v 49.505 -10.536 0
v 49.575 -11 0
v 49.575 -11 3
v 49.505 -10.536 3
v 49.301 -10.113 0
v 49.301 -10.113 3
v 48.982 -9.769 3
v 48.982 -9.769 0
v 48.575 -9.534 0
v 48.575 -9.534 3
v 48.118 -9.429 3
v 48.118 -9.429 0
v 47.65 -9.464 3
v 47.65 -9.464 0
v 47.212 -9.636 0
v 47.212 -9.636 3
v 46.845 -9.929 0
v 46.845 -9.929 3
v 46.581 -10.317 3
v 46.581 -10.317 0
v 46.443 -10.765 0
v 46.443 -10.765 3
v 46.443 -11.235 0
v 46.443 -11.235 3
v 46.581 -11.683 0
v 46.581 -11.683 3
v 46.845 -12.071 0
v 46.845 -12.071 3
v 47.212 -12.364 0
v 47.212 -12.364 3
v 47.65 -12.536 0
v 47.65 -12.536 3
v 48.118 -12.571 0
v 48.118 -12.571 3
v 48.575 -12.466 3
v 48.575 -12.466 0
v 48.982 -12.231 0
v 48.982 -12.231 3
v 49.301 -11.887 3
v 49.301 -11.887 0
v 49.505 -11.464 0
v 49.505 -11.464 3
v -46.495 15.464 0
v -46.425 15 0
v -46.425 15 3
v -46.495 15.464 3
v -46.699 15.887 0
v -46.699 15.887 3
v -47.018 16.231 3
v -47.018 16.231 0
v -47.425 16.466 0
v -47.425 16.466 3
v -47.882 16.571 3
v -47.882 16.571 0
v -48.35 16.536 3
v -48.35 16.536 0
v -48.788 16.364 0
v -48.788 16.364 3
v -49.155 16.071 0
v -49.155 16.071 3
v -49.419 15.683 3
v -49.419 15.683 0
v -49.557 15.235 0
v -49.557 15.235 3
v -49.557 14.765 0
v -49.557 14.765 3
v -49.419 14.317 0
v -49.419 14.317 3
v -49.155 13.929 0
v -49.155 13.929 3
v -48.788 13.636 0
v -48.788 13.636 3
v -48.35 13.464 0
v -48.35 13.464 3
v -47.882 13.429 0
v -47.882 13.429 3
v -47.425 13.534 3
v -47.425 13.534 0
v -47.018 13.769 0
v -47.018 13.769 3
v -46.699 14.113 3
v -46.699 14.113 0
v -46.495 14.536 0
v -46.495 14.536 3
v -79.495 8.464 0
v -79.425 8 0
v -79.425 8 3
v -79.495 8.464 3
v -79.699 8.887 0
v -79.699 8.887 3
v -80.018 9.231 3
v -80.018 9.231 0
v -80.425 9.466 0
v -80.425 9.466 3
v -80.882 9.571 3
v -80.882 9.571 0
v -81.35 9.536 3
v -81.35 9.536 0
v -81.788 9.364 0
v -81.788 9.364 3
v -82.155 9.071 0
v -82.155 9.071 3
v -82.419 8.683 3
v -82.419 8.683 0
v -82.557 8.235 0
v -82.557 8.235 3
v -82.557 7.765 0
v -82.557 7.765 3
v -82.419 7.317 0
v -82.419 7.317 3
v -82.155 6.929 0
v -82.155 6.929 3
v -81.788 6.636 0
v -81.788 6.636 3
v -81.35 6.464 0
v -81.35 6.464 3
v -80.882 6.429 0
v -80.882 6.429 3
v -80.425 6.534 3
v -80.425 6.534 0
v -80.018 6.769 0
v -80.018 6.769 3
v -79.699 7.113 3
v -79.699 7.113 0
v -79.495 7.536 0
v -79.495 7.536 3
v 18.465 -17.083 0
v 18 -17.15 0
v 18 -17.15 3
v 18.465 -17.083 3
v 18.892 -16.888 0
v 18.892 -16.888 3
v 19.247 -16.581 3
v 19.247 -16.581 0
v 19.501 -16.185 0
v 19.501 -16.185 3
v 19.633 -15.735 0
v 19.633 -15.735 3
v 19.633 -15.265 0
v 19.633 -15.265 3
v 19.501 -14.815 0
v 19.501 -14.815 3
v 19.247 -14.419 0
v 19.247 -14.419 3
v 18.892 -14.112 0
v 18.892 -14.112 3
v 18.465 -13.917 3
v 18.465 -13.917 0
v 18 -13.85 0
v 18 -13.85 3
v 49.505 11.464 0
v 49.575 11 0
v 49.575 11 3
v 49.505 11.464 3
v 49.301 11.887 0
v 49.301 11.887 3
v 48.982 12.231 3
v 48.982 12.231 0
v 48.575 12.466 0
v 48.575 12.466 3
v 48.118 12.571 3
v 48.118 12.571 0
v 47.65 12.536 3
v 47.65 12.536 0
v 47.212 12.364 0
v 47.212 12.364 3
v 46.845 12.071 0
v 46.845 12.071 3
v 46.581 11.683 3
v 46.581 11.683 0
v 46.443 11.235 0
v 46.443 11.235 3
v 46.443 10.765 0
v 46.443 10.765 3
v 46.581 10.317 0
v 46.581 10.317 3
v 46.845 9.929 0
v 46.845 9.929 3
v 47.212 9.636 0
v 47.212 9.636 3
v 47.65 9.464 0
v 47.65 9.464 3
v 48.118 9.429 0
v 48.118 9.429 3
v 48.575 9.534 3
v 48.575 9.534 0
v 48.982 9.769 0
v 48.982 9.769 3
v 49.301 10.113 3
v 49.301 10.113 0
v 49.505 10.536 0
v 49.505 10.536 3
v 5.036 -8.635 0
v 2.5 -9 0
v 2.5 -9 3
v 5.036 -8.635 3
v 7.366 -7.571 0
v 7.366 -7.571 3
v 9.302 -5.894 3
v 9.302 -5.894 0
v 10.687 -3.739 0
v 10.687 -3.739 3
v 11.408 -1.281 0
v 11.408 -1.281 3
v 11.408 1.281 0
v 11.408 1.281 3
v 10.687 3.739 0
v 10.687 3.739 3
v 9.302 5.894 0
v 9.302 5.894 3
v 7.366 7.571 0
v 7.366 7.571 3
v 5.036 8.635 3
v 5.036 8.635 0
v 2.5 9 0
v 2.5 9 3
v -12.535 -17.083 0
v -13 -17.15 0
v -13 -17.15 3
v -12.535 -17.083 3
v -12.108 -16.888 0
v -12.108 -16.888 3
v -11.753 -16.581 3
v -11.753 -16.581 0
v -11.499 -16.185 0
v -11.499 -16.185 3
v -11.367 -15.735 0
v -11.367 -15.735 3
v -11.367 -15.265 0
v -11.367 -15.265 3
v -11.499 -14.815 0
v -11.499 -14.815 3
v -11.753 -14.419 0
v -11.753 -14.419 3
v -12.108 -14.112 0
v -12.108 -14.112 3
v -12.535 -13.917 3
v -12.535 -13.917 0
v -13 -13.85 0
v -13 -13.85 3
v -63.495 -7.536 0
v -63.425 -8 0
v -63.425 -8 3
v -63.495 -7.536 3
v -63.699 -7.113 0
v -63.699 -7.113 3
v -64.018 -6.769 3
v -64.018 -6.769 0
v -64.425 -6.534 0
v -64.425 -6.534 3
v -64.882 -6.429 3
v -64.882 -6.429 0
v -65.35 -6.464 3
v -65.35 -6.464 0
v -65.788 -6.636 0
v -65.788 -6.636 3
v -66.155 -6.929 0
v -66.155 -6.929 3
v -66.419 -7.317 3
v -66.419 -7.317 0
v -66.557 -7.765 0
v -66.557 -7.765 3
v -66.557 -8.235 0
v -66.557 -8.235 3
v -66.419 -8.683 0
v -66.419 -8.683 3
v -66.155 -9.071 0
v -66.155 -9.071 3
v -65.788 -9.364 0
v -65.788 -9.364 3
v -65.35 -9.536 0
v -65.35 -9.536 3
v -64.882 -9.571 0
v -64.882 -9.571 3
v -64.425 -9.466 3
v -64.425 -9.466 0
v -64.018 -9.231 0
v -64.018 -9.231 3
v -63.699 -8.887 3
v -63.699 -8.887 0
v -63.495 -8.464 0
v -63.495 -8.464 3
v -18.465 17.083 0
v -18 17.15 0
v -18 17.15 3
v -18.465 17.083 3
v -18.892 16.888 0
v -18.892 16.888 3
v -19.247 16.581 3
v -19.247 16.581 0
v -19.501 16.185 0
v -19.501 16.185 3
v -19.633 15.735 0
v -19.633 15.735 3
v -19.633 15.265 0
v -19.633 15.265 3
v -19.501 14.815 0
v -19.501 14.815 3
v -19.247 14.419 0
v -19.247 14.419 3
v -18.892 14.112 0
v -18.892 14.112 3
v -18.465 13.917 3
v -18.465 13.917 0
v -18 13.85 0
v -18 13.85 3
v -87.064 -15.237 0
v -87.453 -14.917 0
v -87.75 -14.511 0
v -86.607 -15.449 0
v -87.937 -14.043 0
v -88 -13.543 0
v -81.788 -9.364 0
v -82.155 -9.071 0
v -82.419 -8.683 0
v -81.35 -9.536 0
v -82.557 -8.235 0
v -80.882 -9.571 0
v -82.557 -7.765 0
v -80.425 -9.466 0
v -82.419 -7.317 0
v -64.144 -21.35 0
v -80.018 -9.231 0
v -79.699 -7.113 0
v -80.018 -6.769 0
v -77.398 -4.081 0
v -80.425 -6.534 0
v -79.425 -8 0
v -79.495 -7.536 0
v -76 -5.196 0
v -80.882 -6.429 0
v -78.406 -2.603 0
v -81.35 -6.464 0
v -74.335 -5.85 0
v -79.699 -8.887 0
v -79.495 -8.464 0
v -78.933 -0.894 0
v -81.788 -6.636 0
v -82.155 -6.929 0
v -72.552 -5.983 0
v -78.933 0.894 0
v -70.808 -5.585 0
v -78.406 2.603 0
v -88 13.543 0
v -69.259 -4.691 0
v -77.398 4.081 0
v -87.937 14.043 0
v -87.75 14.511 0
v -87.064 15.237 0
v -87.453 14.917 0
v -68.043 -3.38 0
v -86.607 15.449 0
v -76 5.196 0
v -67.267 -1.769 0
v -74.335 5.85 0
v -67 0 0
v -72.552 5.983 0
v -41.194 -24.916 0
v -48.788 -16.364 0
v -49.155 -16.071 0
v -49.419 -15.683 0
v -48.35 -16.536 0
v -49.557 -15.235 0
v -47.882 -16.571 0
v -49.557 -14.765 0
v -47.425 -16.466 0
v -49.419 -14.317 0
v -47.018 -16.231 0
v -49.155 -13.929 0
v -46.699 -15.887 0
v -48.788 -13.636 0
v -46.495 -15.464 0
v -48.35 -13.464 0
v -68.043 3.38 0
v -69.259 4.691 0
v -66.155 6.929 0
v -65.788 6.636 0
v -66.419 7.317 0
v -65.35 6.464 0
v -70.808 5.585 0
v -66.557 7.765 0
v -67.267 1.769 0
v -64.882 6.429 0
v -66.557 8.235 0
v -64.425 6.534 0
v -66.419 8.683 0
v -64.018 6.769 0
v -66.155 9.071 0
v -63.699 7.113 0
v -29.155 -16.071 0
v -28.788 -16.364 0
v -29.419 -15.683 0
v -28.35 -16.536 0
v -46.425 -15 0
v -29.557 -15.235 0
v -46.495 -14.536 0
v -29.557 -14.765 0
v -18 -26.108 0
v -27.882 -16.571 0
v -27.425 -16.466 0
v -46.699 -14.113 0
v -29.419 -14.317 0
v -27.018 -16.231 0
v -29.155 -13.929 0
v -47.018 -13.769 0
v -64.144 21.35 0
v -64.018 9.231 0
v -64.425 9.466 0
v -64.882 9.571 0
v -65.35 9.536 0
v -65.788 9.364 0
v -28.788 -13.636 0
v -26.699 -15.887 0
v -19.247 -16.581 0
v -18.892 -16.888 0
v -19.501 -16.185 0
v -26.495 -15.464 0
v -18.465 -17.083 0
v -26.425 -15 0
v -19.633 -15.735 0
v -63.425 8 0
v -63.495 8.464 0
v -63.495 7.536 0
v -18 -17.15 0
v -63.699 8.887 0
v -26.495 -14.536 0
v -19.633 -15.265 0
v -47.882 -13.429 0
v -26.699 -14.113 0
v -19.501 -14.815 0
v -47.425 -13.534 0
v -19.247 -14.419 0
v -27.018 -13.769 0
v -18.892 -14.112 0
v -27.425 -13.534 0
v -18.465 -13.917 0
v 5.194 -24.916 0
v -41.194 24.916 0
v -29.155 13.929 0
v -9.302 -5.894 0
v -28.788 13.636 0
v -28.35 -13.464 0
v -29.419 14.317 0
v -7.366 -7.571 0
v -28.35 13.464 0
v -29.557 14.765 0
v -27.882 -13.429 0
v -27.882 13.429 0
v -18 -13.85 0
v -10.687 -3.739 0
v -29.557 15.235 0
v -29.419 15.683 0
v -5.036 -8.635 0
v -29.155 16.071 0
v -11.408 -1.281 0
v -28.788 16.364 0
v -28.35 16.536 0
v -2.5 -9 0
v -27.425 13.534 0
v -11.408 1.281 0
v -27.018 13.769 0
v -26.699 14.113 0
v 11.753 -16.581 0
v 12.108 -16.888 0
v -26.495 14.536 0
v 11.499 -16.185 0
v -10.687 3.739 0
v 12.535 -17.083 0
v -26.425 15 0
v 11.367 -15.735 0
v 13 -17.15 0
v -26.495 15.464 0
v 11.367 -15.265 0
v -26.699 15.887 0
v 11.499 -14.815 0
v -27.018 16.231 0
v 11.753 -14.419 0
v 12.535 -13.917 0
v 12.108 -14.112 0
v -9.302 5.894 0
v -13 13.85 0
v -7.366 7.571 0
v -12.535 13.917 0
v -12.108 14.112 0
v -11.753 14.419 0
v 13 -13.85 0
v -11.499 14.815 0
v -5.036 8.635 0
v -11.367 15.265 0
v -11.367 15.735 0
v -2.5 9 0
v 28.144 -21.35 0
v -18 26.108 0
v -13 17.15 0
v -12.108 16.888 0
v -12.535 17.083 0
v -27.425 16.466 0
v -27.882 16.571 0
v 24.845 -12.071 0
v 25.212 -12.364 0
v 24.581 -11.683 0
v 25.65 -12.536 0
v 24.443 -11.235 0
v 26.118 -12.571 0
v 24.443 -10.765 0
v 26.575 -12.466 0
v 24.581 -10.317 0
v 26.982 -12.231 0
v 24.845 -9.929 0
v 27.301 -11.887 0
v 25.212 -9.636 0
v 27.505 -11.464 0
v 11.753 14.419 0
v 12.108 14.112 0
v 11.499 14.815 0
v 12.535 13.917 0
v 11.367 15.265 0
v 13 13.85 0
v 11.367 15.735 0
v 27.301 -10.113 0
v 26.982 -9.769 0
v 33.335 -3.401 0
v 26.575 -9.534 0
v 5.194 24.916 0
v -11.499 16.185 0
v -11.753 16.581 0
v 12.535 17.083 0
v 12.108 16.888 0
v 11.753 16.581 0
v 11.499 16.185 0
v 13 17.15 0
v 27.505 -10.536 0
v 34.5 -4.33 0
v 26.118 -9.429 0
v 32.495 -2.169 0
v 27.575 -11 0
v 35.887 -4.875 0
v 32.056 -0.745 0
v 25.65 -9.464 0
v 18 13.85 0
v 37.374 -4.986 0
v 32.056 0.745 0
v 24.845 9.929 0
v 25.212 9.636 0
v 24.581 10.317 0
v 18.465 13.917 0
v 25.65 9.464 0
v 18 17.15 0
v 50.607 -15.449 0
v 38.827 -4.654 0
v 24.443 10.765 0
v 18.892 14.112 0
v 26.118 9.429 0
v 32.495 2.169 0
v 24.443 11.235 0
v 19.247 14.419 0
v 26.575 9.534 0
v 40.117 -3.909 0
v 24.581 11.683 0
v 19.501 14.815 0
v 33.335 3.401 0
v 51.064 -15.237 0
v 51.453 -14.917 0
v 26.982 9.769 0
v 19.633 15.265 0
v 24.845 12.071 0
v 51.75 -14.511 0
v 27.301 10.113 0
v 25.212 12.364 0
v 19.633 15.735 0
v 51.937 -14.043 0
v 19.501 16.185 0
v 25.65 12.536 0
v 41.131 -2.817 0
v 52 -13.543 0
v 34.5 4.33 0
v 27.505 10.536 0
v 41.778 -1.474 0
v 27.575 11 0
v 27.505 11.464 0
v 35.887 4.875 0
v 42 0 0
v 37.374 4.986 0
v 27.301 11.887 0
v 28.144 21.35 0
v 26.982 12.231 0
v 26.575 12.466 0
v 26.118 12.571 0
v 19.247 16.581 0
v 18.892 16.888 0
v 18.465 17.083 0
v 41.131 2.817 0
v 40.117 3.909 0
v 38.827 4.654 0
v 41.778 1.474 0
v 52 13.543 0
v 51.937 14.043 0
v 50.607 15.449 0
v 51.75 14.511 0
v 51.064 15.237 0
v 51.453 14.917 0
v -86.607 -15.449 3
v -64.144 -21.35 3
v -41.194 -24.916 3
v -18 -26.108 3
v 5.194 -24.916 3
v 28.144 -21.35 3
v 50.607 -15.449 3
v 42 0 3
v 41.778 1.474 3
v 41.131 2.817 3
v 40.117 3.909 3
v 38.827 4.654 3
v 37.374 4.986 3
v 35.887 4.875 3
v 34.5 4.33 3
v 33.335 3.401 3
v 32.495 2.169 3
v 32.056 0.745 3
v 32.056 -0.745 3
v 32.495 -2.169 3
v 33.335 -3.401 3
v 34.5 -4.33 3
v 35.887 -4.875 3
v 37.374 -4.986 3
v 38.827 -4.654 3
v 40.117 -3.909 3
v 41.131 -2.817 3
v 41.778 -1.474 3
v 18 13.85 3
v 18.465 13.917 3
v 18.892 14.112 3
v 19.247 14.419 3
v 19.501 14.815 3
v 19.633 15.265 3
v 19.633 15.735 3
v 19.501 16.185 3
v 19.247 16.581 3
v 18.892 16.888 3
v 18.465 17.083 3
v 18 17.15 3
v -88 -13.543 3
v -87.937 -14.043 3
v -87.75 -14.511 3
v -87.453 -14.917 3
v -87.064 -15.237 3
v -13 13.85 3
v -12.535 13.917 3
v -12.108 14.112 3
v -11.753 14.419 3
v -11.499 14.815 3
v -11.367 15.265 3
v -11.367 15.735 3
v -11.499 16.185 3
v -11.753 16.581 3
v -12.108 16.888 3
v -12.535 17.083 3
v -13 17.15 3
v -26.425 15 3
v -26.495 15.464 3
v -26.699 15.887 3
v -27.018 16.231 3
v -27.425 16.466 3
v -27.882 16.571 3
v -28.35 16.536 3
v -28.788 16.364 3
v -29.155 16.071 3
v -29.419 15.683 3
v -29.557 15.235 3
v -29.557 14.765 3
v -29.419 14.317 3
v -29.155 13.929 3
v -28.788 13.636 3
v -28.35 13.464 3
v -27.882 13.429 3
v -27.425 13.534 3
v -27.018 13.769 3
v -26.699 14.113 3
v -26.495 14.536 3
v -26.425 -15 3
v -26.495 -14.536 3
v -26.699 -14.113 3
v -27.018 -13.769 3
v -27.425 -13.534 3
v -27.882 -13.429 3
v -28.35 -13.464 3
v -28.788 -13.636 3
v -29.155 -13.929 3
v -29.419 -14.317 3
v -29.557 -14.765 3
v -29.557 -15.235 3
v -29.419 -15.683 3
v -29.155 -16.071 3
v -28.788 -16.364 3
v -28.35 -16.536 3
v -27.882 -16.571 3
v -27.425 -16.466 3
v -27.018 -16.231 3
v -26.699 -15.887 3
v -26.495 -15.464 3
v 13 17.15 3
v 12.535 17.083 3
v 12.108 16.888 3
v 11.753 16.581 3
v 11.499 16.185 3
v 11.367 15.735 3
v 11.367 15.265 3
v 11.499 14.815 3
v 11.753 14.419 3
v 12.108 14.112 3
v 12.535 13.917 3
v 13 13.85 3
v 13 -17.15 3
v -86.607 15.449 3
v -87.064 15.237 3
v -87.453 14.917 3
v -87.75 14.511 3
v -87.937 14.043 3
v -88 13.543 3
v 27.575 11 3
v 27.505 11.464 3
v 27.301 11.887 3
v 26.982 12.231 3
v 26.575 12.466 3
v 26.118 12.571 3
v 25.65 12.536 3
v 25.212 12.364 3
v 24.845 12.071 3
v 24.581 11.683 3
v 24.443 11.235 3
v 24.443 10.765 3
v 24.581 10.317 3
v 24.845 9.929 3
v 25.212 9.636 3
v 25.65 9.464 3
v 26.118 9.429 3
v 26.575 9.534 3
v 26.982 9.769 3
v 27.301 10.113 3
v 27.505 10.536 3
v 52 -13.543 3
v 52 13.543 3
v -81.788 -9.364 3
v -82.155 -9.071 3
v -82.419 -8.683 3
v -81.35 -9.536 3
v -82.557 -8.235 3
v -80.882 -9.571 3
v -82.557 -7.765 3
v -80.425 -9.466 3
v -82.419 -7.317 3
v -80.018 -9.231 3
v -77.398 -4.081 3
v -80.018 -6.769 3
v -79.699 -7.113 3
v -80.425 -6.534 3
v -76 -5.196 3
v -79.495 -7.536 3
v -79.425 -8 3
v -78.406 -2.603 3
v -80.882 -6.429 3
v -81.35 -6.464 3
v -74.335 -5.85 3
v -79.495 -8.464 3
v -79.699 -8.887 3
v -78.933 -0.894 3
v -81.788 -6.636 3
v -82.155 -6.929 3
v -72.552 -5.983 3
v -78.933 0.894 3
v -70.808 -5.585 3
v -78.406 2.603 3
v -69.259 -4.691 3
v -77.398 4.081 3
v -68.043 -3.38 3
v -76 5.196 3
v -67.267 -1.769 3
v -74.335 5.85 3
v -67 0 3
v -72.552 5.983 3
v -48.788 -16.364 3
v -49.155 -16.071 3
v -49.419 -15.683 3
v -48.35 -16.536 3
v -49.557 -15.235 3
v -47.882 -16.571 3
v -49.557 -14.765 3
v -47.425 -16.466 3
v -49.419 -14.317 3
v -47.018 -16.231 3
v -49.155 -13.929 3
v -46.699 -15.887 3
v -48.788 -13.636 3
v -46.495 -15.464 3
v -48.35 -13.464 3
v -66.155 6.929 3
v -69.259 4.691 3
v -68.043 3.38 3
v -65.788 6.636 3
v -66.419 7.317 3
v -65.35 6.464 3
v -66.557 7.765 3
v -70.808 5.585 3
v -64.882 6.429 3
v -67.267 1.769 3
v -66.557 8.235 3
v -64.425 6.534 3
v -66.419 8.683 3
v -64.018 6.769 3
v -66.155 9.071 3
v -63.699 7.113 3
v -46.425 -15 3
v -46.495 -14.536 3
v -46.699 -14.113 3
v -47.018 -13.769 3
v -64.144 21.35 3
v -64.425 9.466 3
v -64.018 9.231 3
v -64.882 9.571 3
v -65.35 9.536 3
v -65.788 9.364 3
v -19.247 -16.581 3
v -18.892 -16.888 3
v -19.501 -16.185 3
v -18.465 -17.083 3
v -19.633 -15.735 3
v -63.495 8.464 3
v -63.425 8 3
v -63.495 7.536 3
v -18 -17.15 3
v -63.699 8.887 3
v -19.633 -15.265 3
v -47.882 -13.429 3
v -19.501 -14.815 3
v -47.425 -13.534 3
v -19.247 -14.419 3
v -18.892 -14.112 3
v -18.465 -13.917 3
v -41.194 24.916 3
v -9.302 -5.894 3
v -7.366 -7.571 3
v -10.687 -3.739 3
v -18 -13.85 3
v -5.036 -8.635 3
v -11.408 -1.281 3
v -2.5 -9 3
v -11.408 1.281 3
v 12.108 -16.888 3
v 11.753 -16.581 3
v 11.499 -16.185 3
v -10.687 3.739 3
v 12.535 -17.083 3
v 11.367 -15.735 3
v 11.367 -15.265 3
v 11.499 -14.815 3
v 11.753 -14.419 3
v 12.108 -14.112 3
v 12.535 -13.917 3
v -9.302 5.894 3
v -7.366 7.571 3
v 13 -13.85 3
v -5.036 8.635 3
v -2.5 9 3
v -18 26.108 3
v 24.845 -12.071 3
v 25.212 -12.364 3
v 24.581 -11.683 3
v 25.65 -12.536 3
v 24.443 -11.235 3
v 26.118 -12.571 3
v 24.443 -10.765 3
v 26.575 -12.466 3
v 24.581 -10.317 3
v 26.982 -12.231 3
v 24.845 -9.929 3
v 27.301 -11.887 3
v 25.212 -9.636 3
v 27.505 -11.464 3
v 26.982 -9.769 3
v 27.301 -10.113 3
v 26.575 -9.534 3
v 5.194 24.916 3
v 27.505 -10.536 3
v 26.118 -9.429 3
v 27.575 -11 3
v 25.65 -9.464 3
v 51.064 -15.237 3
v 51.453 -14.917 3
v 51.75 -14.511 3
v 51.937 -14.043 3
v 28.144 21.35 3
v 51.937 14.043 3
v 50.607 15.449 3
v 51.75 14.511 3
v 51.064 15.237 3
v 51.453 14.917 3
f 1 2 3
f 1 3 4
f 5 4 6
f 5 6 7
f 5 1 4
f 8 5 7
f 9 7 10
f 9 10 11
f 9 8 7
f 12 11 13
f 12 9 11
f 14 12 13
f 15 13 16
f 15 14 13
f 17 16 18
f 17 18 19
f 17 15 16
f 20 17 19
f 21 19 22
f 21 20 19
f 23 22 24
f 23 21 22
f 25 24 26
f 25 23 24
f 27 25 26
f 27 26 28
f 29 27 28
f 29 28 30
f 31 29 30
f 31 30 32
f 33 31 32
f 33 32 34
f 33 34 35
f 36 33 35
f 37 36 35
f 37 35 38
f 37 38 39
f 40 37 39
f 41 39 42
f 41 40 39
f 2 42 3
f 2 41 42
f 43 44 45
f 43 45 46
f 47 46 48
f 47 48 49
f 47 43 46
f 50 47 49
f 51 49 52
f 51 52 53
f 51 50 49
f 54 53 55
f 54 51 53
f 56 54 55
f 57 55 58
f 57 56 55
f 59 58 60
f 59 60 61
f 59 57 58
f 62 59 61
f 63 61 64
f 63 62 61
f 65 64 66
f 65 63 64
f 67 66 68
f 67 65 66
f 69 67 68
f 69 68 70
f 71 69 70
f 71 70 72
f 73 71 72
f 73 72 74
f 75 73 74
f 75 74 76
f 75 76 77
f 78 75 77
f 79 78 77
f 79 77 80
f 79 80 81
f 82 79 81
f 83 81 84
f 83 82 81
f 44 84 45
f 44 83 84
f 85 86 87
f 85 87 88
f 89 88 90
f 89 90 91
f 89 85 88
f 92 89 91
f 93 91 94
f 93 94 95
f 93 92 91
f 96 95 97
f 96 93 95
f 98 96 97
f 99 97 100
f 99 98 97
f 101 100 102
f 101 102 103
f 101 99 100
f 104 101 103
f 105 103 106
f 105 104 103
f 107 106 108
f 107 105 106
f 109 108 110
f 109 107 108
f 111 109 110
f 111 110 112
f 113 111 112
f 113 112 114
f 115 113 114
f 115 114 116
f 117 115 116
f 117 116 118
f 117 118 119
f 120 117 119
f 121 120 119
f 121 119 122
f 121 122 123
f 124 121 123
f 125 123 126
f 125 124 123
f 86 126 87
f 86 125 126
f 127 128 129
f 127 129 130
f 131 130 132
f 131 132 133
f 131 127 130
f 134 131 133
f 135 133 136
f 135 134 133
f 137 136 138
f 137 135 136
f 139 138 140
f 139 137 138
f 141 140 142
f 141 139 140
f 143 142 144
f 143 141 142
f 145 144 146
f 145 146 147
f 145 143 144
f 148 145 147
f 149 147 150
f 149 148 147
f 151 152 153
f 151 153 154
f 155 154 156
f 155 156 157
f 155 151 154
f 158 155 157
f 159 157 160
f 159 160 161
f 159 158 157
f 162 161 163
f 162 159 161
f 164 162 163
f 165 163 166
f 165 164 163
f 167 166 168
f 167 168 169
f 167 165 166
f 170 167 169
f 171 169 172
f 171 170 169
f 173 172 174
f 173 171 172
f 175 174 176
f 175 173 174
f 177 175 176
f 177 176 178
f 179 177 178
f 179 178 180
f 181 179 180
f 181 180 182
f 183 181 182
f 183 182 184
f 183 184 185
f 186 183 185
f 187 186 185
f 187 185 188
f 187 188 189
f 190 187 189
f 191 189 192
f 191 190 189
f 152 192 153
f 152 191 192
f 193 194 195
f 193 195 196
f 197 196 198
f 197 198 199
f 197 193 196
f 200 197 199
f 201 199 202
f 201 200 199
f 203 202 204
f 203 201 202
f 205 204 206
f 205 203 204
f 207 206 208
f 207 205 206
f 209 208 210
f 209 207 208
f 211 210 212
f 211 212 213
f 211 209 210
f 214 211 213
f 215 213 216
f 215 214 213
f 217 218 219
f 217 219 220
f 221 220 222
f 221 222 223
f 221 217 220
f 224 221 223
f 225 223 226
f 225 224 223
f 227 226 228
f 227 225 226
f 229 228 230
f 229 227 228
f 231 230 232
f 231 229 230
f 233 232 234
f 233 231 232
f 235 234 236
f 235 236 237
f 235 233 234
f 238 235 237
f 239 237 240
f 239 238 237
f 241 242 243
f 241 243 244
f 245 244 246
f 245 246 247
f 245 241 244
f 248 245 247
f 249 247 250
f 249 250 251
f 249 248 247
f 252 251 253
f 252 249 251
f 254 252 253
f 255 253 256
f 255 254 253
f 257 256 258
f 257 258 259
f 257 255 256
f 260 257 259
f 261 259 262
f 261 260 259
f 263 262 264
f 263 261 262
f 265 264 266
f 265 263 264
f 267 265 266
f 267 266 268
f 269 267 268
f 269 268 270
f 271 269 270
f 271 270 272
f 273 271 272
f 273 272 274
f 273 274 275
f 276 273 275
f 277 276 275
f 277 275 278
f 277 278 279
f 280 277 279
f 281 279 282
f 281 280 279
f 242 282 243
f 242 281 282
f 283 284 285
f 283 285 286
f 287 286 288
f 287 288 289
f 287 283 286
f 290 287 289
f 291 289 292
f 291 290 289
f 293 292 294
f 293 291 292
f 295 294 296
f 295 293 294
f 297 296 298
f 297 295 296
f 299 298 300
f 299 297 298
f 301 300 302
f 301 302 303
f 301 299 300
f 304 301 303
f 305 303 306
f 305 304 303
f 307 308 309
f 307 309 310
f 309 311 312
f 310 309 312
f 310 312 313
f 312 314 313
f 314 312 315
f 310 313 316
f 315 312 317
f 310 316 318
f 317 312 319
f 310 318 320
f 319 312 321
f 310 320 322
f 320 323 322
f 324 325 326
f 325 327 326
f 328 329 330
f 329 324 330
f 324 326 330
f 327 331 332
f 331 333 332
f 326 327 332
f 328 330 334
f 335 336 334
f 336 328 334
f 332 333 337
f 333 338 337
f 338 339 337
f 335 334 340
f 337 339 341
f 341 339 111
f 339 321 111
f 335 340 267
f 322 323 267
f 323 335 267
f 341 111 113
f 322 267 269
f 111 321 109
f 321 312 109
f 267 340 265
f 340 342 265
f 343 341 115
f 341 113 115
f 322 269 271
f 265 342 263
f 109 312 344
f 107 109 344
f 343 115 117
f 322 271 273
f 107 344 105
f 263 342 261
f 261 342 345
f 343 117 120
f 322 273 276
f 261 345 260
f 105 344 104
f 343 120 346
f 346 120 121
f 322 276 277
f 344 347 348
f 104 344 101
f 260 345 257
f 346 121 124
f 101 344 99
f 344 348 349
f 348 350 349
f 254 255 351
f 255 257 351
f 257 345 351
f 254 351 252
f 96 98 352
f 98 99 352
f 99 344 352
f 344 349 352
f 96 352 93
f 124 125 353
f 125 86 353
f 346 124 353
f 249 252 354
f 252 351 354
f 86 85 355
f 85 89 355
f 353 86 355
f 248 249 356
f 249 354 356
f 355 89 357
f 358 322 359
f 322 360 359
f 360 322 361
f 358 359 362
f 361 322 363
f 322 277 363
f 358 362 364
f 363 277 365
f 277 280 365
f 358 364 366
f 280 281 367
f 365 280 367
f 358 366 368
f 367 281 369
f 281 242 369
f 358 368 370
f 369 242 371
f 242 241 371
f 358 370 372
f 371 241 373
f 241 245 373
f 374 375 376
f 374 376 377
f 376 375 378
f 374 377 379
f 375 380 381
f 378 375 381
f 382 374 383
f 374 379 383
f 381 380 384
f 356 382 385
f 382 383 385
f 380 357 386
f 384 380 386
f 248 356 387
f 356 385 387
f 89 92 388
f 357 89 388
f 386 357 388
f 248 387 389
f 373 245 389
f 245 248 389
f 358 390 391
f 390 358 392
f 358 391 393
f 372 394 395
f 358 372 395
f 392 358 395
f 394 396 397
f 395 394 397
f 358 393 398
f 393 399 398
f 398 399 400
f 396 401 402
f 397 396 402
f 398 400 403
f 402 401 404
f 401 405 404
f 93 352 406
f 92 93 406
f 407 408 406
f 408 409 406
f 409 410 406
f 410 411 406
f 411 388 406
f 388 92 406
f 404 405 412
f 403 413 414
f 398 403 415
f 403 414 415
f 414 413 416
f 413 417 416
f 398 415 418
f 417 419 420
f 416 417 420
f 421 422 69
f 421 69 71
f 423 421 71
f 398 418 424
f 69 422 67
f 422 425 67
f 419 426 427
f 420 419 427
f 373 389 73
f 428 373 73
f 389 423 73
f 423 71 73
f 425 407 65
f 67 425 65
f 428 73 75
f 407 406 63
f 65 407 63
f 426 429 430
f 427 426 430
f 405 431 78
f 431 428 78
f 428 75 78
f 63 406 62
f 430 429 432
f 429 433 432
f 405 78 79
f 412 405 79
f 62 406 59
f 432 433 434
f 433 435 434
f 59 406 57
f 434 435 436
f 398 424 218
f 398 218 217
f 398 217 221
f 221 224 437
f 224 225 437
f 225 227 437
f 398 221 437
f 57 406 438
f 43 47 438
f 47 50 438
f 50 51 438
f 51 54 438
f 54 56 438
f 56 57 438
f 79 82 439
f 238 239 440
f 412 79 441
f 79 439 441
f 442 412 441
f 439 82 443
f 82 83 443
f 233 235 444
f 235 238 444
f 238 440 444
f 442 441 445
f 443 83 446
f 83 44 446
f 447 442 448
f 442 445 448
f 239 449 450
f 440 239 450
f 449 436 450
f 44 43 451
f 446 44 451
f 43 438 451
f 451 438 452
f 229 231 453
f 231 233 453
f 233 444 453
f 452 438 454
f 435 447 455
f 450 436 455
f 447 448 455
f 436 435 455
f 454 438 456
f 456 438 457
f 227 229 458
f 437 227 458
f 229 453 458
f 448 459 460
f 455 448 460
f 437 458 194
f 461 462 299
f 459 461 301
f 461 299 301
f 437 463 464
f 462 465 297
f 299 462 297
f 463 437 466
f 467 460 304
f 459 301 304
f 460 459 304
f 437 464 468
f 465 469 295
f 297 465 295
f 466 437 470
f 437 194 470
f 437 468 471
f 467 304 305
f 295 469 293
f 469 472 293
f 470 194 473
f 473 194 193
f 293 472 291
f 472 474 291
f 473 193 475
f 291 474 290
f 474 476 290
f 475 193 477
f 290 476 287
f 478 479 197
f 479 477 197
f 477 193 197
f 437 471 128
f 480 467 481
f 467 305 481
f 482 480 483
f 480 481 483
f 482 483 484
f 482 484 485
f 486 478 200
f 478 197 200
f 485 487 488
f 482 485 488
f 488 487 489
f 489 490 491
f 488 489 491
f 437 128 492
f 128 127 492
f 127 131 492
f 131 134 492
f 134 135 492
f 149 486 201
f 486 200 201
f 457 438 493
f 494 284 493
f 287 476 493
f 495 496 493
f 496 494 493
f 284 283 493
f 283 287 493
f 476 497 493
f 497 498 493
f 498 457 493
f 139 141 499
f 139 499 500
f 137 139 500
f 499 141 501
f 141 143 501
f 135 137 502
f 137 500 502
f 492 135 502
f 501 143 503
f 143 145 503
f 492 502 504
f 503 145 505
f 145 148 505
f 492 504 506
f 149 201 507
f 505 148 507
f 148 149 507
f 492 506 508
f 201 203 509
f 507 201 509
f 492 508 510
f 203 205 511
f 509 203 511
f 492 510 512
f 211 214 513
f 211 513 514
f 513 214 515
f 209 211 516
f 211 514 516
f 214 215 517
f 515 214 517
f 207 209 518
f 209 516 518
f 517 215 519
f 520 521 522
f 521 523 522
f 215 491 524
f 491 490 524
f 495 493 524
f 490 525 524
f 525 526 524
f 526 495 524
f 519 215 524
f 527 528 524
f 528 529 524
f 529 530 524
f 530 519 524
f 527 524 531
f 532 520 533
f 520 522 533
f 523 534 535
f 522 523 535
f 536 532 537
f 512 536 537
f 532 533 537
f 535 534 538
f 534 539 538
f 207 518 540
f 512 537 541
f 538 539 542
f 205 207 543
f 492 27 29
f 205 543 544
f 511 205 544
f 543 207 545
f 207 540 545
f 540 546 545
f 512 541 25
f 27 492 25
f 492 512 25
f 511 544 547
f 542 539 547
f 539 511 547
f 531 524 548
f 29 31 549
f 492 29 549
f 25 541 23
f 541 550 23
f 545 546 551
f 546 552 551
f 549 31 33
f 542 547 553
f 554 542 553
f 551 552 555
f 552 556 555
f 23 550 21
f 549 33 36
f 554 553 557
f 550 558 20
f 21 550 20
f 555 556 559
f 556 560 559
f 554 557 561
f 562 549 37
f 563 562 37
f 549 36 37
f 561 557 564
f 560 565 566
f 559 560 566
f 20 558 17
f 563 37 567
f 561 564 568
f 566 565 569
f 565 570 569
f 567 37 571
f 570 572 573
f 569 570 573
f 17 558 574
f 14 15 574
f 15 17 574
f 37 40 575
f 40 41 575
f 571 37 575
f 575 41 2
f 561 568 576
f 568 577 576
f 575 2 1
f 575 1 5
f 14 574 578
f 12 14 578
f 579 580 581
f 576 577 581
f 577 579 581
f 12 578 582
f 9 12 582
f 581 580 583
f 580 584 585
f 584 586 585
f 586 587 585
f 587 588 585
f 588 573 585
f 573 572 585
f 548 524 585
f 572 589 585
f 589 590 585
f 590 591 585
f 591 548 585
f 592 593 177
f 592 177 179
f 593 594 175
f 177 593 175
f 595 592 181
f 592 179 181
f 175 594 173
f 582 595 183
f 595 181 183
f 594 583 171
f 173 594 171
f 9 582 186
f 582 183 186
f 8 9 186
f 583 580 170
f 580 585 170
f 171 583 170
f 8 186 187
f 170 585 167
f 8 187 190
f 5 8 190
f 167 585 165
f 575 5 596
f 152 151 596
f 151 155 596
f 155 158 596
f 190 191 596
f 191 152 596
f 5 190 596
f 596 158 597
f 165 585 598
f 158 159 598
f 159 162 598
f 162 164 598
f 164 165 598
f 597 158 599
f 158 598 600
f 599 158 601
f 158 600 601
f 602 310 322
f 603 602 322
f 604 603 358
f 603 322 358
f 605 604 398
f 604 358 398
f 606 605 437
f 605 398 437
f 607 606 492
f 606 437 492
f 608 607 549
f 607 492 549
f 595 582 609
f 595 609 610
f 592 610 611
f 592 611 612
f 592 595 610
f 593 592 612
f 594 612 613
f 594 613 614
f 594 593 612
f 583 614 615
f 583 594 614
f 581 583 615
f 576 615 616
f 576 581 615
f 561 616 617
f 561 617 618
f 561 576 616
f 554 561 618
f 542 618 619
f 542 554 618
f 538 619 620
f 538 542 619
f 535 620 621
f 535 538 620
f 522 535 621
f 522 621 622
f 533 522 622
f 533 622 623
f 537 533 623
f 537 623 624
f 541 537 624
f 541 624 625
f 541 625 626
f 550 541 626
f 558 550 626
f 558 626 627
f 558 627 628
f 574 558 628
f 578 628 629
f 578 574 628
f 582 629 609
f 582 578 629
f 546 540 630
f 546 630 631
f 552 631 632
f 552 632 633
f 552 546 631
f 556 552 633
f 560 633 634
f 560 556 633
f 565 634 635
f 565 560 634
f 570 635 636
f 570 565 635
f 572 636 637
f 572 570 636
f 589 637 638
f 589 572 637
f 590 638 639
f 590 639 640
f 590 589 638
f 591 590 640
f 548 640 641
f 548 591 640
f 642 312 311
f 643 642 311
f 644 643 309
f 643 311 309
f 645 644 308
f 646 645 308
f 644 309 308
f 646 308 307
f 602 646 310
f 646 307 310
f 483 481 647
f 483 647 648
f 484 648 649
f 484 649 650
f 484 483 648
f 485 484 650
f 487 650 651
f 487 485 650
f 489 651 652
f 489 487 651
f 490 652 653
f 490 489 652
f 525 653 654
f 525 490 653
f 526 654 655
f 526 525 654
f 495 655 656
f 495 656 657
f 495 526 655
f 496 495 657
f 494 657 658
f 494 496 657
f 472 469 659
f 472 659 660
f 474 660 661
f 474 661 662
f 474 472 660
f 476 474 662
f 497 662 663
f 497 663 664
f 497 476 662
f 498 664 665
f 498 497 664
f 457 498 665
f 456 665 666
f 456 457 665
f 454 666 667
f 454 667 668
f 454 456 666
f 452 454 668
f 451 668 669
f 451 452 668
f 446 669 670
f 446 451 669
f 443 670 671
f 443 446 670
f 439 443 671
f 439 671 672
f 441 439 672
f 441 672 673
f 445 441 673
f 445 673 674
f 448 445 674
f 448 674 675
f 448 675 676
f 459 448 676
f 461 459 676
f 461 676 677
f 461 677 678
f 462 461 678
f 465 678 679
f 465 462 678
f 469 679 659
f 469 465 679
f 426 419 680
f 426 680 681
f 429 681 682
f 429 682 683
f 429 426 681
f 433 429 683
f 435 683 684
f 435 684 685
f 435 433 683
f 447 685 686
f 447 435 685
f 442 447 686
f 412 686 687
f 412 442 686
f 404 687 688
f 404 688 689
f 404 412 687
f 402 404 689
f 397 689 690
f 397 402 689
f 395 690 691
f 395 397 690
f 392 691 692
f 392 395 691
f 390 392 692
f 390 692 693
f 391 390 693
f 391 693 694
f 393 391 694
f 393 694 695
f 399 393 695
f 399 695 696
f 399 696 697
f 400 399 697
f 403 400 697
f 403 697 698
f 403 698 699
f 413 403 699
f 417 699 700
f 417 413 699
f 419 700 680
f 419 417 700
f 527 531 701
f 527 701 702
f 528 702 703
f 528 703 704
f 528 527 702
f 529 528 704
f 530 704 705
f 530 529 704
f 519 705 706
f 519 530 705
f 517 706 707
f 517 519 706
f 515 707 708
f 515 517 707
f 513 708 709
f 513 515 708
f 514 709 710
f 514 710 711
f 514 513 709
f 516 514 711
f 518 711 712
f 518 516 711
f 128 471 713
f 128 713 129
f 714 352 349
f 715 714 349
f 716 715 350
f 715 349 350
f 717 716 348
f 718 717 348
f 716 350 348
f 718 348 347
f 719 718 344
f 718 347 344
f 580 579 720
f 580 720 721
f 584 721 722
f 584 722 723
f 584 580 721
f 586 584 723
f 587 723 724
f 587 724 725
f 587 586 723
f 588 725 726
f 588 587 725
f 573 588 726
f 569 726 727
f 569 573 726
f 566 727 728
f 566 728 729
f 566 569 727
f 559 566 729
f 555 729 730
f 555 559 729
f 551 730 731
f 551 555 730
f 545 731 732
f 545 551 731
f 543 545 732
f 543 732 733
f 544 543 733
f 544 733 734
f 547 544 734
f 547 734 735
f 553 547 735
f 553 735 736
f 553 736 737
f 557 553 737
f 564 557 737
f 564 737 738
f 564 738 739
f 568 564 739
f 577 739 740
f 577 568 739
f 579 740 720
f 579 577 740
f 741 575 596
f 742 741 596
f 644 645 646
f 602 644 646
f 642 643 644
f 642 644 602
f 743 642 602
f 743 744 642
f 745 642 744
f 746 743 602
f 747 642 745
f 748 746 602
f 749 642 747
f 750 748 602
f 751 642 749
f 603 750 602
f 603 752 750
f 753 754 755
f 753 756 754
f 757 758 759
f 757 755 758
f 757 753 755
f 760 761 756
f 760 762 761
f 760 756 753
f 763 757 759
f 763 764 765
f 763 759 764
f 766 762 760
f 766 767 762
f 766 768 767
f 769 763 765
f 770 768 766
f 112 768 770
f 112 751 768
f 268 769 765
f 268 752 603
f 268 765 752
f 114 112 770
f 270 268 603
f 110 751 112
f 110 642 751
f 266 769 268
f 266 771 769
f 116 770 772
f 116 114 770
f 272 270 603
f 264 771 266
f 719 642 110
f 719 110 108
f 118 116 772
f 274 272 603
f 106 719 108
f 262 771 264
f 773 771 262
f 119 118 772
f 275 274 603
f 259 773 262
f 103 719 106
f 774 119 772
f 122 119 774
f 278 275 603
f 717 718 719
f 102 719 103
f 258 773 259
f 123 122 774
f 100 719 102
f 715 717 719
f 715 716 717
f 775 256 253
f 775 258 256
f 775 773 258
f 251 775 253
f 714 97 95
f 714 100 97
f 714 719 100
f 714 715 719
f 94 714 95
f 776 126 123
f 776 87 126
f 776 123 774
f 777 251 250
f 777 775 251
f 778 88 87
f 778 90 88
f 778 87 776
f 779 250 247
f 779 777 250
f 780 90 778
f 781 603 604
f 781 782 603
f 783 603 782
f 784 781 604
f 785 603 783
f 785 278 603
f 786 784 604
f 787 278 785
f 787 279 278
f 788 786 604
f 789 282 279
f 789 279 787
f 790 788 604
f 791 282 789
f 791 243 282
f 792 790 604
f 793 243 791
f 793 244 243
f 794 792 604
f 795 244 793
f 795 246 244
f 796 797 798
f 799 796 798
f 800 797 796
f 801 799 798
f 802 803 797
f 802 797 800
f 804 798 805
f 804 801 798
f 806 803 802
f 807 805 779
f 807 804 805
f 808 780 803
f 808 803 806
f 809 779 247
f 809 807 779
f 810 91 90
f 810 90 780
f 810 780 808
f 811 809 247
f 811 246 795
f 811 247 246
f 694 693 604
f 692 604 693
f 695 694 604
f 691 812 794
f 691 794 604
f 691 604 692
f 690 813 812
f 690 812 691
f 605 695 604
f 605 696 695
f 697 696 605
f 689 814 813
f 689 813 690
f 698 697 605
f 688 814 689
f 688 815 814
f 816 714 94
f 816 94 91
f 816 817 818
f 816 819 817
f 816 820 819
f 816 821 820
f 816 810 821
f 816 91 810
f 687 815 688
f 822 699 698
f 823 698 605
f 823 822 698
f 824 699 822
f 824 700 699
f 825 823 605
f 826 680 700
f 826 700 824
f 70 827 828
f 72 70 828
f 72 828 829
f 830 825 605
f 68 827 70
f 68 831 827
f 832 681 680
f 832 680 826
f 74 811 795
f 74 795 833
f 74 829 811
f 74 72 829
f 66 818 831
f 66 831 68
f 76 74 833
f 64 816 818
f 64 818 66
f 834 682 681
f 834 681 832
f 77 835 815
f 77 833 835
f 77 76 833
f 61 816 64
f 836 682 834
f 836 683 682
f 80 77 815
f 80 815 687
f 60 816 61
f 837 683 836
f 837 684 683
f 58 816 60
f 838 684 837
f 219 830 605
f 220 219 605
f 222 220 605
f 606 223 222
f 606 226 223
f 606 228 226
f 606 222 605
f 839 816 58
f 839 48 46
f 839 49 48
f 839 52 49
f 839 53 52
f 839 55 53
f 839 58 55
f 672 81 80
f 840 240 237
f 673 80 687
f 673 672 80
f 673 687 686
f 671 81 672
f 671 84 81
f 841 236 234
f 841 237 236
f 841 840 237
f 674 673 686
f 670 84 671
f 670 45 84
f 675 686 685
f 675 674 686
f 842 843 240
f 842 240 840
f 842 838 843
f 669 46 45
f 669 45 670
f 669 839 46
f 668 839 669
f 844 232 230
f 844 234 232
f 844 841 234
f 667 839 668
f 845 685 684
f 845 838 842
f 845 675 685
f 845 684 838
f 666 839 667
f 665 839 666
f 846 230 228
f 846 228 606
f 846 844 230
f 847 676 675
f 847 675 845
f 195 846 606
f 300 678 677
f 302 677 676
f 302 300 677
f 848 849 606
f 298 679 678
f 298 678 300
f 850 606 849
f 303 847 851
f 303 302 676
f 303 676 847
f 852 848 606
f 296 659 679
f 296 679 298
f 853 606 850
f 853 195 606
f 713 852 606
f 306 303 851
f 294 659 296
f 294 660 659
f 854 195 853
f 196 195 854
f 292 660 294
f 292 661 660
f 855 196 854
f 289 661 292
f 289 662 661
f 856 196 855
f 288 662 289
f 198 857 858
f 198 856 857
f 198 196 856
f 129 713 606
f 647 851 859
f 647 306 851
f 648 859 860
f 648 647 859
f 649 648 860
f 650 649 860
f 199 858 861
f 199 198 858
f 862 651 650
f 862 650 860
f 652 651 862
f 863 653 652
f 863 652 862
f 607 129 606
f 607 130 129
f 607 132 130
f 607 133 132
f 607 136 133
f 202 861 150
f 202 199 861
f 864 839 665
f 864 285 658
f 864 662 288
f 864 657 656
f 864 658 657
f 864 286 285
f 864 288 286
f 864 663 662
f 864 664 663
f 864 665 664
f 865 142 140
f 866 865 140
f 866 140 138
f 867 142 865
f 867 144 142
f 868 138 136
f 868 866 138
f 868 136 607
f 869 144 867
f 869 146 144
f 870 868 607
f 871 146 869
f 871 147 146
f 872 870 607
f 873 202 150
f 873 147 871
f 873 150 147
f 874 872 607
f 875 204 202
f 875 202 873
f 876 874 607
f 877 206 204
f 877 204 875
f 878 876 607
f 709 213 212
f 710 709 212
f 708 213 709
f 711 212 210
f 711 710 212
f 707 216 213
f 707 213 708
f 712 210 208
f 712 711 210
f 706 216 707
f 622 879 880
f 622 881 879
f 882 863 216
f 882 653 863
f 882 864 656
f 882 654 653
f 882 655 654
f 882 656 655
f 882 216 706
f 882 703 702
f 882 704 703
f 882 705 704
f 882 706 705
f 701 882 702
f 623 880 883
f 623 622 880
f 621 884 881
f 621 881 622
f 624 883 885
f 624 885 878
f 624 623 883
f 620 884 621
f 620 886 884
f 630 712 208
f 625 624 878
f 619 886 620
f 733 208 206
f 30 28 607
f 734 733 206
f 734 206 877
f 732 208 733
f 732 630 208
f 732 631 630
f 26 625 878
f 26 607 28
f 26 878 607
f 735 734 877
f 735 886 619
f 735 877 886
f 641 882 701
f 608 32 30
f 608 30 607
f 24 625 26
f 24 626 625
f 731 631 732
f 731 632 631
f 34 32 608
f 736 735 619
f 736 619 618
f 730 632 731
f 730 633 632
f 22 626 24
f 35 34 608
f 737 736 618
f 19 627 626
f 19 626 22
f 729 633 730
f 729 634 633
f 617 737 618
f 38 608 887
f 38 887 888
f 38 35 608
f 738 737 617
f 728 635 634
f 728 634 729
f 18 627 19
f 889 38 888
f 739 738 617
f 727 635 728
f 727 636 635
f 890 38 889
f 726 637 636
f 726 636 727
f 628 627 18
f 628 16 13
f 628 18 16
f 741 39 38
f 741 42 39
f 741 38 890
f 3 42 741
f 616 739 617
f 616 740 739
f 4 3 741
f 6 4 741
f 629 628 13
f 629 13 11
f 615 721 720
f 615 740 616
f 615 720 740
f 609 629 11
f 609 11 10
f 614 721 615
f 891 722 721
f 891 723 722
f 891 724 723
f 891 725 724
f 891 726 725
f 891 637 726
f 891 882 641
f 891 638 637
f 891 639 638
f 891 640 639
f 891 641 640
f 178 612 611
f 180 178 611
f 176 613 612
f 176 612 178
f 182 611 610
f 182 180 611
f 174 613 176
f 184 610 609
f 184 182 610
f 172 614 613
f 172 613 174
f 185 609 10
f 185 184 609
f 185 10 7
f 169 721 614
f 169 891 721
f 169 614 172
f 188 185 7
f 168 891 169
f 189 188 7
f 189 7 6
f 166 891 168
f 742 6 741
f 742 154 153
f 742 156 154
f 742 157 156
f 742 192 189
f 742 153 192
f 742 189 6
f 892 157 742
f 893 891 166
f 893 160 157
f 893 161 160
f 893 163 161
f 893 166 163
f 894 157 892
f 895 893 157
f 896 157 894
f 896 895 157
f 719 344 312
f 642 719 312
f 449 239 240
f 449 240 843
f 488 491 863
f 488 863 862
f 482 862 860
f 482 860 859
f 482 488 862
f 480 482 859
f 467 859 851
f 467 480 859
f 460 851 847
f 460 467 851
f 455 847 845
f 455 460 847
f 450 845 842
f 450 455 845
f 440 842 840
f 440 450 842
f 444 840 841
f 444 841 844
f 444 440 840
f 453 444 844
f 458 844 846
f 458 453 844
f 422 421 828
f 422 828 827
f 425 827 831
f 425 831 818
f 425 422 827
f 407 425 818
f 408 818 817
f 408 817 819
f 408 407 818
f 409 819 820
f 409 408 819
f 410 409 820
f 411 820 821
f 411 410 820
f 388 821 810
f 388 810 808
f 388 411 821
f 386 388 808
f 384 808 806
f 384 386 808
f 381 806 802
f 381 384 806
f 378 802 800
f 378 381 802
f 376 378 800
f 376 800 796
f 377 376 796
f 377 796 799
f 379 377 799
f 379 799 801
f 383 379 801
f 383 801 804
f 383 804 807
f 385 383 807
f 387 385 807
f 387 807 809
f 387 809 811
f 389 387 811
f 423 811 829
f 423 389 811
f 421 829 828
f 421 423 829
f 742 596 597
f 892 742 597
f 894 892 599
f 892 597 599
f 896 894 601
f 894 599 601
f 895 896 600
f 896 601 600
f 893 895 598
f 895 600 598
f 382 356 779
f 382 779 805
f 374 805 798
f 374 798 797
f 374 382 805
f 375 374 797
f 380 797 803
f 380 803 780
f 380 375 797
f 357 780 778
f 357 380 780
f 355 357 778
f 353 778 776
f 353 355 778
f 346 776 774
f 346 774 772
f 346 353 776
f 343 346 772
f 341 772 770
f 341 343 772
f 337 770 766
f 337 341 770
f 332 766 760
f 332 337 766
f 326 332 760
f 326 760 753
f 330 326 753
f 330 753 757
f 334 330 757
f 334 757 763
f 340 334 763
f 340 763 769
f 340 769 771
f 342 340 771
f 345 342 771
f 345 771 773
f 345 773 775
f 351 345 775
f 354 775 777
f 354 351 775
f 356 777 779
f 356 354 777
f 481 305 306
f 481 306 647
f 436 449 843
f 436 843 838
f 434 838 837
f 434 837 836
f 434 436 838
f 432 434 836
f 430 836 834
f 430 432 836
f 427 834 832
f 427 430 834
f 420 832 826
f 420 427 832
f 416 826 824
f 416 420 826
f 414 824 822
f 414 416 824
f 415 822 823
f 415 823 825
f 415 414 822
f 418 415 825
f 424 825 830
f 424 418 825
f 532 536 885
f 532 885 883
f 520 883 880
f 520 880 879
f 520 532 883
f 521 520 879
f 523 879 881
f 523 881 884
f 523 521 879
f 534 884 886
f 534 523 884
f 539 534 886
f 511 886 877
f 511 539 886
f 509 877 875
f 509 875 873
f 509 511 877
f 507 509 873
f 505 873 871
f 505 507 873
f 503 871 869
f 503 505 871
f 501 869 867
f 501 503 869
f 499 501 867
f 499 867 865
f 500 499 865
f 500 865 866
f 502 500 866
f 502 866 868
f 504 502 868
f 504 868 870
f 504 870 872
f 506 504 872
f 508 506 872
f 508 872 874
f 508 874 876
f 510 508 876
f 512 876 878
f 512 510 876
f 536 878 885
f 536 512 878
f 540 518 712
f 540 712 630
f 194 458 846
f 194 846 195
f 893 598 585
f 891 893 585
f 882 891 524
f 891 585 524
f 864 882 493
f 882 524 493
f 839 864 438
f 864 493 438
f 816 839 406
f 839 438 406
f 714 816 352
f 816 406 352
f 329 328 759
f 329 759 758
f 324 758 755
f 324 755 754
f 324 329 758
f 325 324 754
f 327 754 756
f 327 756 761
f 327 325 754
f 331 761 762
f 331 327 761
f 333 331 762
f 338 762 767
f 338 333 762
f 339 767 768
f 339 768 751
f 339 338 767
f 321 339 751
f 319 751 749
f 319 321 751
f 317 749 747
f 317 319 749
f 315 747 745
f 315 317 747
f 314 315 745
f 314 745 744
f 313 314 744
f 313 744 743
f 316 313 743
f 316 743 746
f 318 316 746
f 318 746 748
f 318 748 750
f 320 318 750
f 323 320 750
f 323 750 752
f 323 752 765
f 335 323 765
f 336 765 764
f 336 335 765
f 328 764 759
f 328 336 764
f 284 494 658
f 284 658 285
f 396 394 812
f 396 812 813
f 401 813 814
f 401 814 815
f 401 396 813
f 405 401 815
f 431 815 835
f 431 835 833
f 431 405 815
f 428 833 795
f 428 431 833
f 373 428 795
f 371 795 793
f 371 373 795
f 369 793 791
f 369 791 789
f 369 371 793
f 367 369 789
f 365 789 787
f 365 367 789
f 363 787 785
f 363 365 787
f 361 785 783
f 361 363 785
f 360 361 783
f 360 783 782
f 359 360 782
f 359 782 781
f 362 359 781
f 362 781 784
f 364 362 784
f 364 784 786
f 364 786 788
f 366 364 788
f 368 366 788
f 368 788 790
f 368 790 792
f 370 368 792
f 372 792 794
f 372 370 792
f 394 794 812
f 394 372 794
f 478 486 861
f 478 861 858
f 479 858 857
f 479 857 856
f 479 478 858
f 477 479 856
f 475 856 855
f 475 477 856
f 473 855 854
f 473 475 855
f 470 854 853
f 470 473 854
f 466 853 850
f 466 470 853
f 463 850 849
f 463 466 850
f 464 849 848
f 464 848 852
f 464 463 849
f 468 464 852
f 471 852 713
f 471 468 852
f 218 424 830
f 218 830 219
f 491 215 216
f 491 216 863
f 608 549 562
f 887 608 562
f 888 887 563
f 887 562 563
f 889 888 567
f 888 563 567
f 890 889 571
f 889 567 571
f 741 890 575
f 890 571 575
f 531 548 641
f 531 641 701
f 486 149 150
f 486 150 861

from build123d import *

# Parameters (mm, degrees)
MODEL_R         = 5
MODEL_R_2       = 6
MODEL_R_3       = 1.575
EXTRUDE_1_DEPTH = 3


with BuildPart() as part:
    # Model → 凸台-拉伸1 (new body)
    with BuildSketch(Plane.XY):
        with BuildLine():
            Line((-88, 13.542891419), (-88, -13.542891419))
            ThreePointArc((-88, -13.542891419), (-87.614574011, -14.723209496), (-86.606849237, -15.448602311))
            ThreePointArc((-86.606849237, -15.448602311), (-18, -26.108381092), (50.606849237, -15.448602311))
            ThreePointArc((50.606849237, -15.448602311), (51.614574011, -14.723209496), (52, -13.542891419))
            Line((52, -13.542891419), (52, 13.542891419))
            ThreePointArc((52, 13.542891419), (51.614574011, 14.723209496), (50.606849237, 15.448602311))
            ThreePointArc((50.606849237, 15.448602311), (-18, 26.108381092), (-86.606849237, 15.448602311))
            ThreePointArc((-86.606849237, 15.448602311), (-87.614574011, 14.723209496), (-88, 13.542891419))
        make_face()
        with Locations((37, 0)):
            Circle(MODEL_R, mode=Mode.SUBTRACT)
        with Locations((-73, 0)):
            Circle(MODEL_R_2, mode=Mode.SUBTRACT)
        with Locations((26, 11)):
            Circle(MODEL_R_3, mode=Mode.SUBTRACT)
        with Locations((48, 11)):
            Circle(MODEL_R_3, mode=Mode.SUBTRACT)
        with Locations((48, -11)):
            Circle(MODEL_R_3, mode=Mode.SUBTRACT)
        with Locations((26, -11)):
            Circle(MODEL_R_3, mode=Mode.SUBTRACT)
        with Locations((-81, 8)):
            Circle(MODEL_R_3, mode=Mode.SUBTRACT)
        with Locations((-65, 8)):
            Circle(MODEL_R_3, mode=Mode.SUBTRACT)
        with Locations((-65, -8)):
            Circle(MODEL_R_3, mode=Mode.SUBTRACT)
        with Locations((-81, -8)):
            Circle(MODEL_R_3, mode=Mode.SUBTRACT)
        with Locations((-28, 15)):
            Circle(MODEL_R_3, mode=Mode.SUBTRACT)
        with Locations((-28, -15)):
            Circle(MODEL_R_3, mode=Mode.SUBTRACT)
        with Locations((-48, -15)):
            Circle(MODEL_R_3, mode=Mode.SUBTRACT)
        with Locations((-48, 15)):
            Circle(MODEL_R_3, mode=Mode.SUBTRACT)
        with BuildLine():
            Line((2.5, 9), (-2.5, 9))
            ThreePointArc((-2.5, 9), (-11.5, 0), (-2.5, -9))
            Line((-2.5, -9), (2.5, -9))
            ThreePointArc((2.5, -9), (11.5, 0), (2.5, 9))
        make_face(mode=Mode.SUBTRACT)
        with BuildLine():
            Line((-13, 17.15), (-18, 17.15))
            ThreePointArc((-18, 17.15), (-19.65, 15.5), (-18, 13.85))
            Line((-18, 13.85), (-13, 13.85))
            ThreePointArc((-13, 13.85), (-11.35, 15.5), (-13, 17.15))
        make_face(mode=Mode.SUBTRACT)
        with BuildLine():
            Line((18, 17.15), (13, 17.15))
            ThreePointArc((13, 17.15), (11.35, 15.5), (13, 13.85))
            Line((13, 13.85), (18, 13.85))
            ThreePointArc((18, 13.85), (19.65, 15.5), (18, 17.15))
        make_face(mode=Mode.SUBTRACT)
        with BuildLine():
            Line((13, -17.15), (18, -17.15))
            ThreePointArc((18, -17.15), (19.65, -15.5), (18, -13.85))
            Line((18, -13.85), (13, -13.85))
            ThreePointArc((13, -13.85), (11.35, -15.5), (13, -17.15))
        make_face(mode=Mode.SUBTRACT)
        with BuildLine():
            Line((-13, -13.85), (-18, -13.85))
            ThreePointArc((-18, -13.85), (-19.65, -15.5), (-18, -17.15))
            Line((-18, -17.15), (-13, -17.15))
            ThreePointArc((-13, -17.15), (-11.35, -15.5), (-13, -13.85))
        make_face(mode=Mode.SUBTRACT)
    extrude(amount=EXTRUDE_1_DEPTH)


solid = part.part
